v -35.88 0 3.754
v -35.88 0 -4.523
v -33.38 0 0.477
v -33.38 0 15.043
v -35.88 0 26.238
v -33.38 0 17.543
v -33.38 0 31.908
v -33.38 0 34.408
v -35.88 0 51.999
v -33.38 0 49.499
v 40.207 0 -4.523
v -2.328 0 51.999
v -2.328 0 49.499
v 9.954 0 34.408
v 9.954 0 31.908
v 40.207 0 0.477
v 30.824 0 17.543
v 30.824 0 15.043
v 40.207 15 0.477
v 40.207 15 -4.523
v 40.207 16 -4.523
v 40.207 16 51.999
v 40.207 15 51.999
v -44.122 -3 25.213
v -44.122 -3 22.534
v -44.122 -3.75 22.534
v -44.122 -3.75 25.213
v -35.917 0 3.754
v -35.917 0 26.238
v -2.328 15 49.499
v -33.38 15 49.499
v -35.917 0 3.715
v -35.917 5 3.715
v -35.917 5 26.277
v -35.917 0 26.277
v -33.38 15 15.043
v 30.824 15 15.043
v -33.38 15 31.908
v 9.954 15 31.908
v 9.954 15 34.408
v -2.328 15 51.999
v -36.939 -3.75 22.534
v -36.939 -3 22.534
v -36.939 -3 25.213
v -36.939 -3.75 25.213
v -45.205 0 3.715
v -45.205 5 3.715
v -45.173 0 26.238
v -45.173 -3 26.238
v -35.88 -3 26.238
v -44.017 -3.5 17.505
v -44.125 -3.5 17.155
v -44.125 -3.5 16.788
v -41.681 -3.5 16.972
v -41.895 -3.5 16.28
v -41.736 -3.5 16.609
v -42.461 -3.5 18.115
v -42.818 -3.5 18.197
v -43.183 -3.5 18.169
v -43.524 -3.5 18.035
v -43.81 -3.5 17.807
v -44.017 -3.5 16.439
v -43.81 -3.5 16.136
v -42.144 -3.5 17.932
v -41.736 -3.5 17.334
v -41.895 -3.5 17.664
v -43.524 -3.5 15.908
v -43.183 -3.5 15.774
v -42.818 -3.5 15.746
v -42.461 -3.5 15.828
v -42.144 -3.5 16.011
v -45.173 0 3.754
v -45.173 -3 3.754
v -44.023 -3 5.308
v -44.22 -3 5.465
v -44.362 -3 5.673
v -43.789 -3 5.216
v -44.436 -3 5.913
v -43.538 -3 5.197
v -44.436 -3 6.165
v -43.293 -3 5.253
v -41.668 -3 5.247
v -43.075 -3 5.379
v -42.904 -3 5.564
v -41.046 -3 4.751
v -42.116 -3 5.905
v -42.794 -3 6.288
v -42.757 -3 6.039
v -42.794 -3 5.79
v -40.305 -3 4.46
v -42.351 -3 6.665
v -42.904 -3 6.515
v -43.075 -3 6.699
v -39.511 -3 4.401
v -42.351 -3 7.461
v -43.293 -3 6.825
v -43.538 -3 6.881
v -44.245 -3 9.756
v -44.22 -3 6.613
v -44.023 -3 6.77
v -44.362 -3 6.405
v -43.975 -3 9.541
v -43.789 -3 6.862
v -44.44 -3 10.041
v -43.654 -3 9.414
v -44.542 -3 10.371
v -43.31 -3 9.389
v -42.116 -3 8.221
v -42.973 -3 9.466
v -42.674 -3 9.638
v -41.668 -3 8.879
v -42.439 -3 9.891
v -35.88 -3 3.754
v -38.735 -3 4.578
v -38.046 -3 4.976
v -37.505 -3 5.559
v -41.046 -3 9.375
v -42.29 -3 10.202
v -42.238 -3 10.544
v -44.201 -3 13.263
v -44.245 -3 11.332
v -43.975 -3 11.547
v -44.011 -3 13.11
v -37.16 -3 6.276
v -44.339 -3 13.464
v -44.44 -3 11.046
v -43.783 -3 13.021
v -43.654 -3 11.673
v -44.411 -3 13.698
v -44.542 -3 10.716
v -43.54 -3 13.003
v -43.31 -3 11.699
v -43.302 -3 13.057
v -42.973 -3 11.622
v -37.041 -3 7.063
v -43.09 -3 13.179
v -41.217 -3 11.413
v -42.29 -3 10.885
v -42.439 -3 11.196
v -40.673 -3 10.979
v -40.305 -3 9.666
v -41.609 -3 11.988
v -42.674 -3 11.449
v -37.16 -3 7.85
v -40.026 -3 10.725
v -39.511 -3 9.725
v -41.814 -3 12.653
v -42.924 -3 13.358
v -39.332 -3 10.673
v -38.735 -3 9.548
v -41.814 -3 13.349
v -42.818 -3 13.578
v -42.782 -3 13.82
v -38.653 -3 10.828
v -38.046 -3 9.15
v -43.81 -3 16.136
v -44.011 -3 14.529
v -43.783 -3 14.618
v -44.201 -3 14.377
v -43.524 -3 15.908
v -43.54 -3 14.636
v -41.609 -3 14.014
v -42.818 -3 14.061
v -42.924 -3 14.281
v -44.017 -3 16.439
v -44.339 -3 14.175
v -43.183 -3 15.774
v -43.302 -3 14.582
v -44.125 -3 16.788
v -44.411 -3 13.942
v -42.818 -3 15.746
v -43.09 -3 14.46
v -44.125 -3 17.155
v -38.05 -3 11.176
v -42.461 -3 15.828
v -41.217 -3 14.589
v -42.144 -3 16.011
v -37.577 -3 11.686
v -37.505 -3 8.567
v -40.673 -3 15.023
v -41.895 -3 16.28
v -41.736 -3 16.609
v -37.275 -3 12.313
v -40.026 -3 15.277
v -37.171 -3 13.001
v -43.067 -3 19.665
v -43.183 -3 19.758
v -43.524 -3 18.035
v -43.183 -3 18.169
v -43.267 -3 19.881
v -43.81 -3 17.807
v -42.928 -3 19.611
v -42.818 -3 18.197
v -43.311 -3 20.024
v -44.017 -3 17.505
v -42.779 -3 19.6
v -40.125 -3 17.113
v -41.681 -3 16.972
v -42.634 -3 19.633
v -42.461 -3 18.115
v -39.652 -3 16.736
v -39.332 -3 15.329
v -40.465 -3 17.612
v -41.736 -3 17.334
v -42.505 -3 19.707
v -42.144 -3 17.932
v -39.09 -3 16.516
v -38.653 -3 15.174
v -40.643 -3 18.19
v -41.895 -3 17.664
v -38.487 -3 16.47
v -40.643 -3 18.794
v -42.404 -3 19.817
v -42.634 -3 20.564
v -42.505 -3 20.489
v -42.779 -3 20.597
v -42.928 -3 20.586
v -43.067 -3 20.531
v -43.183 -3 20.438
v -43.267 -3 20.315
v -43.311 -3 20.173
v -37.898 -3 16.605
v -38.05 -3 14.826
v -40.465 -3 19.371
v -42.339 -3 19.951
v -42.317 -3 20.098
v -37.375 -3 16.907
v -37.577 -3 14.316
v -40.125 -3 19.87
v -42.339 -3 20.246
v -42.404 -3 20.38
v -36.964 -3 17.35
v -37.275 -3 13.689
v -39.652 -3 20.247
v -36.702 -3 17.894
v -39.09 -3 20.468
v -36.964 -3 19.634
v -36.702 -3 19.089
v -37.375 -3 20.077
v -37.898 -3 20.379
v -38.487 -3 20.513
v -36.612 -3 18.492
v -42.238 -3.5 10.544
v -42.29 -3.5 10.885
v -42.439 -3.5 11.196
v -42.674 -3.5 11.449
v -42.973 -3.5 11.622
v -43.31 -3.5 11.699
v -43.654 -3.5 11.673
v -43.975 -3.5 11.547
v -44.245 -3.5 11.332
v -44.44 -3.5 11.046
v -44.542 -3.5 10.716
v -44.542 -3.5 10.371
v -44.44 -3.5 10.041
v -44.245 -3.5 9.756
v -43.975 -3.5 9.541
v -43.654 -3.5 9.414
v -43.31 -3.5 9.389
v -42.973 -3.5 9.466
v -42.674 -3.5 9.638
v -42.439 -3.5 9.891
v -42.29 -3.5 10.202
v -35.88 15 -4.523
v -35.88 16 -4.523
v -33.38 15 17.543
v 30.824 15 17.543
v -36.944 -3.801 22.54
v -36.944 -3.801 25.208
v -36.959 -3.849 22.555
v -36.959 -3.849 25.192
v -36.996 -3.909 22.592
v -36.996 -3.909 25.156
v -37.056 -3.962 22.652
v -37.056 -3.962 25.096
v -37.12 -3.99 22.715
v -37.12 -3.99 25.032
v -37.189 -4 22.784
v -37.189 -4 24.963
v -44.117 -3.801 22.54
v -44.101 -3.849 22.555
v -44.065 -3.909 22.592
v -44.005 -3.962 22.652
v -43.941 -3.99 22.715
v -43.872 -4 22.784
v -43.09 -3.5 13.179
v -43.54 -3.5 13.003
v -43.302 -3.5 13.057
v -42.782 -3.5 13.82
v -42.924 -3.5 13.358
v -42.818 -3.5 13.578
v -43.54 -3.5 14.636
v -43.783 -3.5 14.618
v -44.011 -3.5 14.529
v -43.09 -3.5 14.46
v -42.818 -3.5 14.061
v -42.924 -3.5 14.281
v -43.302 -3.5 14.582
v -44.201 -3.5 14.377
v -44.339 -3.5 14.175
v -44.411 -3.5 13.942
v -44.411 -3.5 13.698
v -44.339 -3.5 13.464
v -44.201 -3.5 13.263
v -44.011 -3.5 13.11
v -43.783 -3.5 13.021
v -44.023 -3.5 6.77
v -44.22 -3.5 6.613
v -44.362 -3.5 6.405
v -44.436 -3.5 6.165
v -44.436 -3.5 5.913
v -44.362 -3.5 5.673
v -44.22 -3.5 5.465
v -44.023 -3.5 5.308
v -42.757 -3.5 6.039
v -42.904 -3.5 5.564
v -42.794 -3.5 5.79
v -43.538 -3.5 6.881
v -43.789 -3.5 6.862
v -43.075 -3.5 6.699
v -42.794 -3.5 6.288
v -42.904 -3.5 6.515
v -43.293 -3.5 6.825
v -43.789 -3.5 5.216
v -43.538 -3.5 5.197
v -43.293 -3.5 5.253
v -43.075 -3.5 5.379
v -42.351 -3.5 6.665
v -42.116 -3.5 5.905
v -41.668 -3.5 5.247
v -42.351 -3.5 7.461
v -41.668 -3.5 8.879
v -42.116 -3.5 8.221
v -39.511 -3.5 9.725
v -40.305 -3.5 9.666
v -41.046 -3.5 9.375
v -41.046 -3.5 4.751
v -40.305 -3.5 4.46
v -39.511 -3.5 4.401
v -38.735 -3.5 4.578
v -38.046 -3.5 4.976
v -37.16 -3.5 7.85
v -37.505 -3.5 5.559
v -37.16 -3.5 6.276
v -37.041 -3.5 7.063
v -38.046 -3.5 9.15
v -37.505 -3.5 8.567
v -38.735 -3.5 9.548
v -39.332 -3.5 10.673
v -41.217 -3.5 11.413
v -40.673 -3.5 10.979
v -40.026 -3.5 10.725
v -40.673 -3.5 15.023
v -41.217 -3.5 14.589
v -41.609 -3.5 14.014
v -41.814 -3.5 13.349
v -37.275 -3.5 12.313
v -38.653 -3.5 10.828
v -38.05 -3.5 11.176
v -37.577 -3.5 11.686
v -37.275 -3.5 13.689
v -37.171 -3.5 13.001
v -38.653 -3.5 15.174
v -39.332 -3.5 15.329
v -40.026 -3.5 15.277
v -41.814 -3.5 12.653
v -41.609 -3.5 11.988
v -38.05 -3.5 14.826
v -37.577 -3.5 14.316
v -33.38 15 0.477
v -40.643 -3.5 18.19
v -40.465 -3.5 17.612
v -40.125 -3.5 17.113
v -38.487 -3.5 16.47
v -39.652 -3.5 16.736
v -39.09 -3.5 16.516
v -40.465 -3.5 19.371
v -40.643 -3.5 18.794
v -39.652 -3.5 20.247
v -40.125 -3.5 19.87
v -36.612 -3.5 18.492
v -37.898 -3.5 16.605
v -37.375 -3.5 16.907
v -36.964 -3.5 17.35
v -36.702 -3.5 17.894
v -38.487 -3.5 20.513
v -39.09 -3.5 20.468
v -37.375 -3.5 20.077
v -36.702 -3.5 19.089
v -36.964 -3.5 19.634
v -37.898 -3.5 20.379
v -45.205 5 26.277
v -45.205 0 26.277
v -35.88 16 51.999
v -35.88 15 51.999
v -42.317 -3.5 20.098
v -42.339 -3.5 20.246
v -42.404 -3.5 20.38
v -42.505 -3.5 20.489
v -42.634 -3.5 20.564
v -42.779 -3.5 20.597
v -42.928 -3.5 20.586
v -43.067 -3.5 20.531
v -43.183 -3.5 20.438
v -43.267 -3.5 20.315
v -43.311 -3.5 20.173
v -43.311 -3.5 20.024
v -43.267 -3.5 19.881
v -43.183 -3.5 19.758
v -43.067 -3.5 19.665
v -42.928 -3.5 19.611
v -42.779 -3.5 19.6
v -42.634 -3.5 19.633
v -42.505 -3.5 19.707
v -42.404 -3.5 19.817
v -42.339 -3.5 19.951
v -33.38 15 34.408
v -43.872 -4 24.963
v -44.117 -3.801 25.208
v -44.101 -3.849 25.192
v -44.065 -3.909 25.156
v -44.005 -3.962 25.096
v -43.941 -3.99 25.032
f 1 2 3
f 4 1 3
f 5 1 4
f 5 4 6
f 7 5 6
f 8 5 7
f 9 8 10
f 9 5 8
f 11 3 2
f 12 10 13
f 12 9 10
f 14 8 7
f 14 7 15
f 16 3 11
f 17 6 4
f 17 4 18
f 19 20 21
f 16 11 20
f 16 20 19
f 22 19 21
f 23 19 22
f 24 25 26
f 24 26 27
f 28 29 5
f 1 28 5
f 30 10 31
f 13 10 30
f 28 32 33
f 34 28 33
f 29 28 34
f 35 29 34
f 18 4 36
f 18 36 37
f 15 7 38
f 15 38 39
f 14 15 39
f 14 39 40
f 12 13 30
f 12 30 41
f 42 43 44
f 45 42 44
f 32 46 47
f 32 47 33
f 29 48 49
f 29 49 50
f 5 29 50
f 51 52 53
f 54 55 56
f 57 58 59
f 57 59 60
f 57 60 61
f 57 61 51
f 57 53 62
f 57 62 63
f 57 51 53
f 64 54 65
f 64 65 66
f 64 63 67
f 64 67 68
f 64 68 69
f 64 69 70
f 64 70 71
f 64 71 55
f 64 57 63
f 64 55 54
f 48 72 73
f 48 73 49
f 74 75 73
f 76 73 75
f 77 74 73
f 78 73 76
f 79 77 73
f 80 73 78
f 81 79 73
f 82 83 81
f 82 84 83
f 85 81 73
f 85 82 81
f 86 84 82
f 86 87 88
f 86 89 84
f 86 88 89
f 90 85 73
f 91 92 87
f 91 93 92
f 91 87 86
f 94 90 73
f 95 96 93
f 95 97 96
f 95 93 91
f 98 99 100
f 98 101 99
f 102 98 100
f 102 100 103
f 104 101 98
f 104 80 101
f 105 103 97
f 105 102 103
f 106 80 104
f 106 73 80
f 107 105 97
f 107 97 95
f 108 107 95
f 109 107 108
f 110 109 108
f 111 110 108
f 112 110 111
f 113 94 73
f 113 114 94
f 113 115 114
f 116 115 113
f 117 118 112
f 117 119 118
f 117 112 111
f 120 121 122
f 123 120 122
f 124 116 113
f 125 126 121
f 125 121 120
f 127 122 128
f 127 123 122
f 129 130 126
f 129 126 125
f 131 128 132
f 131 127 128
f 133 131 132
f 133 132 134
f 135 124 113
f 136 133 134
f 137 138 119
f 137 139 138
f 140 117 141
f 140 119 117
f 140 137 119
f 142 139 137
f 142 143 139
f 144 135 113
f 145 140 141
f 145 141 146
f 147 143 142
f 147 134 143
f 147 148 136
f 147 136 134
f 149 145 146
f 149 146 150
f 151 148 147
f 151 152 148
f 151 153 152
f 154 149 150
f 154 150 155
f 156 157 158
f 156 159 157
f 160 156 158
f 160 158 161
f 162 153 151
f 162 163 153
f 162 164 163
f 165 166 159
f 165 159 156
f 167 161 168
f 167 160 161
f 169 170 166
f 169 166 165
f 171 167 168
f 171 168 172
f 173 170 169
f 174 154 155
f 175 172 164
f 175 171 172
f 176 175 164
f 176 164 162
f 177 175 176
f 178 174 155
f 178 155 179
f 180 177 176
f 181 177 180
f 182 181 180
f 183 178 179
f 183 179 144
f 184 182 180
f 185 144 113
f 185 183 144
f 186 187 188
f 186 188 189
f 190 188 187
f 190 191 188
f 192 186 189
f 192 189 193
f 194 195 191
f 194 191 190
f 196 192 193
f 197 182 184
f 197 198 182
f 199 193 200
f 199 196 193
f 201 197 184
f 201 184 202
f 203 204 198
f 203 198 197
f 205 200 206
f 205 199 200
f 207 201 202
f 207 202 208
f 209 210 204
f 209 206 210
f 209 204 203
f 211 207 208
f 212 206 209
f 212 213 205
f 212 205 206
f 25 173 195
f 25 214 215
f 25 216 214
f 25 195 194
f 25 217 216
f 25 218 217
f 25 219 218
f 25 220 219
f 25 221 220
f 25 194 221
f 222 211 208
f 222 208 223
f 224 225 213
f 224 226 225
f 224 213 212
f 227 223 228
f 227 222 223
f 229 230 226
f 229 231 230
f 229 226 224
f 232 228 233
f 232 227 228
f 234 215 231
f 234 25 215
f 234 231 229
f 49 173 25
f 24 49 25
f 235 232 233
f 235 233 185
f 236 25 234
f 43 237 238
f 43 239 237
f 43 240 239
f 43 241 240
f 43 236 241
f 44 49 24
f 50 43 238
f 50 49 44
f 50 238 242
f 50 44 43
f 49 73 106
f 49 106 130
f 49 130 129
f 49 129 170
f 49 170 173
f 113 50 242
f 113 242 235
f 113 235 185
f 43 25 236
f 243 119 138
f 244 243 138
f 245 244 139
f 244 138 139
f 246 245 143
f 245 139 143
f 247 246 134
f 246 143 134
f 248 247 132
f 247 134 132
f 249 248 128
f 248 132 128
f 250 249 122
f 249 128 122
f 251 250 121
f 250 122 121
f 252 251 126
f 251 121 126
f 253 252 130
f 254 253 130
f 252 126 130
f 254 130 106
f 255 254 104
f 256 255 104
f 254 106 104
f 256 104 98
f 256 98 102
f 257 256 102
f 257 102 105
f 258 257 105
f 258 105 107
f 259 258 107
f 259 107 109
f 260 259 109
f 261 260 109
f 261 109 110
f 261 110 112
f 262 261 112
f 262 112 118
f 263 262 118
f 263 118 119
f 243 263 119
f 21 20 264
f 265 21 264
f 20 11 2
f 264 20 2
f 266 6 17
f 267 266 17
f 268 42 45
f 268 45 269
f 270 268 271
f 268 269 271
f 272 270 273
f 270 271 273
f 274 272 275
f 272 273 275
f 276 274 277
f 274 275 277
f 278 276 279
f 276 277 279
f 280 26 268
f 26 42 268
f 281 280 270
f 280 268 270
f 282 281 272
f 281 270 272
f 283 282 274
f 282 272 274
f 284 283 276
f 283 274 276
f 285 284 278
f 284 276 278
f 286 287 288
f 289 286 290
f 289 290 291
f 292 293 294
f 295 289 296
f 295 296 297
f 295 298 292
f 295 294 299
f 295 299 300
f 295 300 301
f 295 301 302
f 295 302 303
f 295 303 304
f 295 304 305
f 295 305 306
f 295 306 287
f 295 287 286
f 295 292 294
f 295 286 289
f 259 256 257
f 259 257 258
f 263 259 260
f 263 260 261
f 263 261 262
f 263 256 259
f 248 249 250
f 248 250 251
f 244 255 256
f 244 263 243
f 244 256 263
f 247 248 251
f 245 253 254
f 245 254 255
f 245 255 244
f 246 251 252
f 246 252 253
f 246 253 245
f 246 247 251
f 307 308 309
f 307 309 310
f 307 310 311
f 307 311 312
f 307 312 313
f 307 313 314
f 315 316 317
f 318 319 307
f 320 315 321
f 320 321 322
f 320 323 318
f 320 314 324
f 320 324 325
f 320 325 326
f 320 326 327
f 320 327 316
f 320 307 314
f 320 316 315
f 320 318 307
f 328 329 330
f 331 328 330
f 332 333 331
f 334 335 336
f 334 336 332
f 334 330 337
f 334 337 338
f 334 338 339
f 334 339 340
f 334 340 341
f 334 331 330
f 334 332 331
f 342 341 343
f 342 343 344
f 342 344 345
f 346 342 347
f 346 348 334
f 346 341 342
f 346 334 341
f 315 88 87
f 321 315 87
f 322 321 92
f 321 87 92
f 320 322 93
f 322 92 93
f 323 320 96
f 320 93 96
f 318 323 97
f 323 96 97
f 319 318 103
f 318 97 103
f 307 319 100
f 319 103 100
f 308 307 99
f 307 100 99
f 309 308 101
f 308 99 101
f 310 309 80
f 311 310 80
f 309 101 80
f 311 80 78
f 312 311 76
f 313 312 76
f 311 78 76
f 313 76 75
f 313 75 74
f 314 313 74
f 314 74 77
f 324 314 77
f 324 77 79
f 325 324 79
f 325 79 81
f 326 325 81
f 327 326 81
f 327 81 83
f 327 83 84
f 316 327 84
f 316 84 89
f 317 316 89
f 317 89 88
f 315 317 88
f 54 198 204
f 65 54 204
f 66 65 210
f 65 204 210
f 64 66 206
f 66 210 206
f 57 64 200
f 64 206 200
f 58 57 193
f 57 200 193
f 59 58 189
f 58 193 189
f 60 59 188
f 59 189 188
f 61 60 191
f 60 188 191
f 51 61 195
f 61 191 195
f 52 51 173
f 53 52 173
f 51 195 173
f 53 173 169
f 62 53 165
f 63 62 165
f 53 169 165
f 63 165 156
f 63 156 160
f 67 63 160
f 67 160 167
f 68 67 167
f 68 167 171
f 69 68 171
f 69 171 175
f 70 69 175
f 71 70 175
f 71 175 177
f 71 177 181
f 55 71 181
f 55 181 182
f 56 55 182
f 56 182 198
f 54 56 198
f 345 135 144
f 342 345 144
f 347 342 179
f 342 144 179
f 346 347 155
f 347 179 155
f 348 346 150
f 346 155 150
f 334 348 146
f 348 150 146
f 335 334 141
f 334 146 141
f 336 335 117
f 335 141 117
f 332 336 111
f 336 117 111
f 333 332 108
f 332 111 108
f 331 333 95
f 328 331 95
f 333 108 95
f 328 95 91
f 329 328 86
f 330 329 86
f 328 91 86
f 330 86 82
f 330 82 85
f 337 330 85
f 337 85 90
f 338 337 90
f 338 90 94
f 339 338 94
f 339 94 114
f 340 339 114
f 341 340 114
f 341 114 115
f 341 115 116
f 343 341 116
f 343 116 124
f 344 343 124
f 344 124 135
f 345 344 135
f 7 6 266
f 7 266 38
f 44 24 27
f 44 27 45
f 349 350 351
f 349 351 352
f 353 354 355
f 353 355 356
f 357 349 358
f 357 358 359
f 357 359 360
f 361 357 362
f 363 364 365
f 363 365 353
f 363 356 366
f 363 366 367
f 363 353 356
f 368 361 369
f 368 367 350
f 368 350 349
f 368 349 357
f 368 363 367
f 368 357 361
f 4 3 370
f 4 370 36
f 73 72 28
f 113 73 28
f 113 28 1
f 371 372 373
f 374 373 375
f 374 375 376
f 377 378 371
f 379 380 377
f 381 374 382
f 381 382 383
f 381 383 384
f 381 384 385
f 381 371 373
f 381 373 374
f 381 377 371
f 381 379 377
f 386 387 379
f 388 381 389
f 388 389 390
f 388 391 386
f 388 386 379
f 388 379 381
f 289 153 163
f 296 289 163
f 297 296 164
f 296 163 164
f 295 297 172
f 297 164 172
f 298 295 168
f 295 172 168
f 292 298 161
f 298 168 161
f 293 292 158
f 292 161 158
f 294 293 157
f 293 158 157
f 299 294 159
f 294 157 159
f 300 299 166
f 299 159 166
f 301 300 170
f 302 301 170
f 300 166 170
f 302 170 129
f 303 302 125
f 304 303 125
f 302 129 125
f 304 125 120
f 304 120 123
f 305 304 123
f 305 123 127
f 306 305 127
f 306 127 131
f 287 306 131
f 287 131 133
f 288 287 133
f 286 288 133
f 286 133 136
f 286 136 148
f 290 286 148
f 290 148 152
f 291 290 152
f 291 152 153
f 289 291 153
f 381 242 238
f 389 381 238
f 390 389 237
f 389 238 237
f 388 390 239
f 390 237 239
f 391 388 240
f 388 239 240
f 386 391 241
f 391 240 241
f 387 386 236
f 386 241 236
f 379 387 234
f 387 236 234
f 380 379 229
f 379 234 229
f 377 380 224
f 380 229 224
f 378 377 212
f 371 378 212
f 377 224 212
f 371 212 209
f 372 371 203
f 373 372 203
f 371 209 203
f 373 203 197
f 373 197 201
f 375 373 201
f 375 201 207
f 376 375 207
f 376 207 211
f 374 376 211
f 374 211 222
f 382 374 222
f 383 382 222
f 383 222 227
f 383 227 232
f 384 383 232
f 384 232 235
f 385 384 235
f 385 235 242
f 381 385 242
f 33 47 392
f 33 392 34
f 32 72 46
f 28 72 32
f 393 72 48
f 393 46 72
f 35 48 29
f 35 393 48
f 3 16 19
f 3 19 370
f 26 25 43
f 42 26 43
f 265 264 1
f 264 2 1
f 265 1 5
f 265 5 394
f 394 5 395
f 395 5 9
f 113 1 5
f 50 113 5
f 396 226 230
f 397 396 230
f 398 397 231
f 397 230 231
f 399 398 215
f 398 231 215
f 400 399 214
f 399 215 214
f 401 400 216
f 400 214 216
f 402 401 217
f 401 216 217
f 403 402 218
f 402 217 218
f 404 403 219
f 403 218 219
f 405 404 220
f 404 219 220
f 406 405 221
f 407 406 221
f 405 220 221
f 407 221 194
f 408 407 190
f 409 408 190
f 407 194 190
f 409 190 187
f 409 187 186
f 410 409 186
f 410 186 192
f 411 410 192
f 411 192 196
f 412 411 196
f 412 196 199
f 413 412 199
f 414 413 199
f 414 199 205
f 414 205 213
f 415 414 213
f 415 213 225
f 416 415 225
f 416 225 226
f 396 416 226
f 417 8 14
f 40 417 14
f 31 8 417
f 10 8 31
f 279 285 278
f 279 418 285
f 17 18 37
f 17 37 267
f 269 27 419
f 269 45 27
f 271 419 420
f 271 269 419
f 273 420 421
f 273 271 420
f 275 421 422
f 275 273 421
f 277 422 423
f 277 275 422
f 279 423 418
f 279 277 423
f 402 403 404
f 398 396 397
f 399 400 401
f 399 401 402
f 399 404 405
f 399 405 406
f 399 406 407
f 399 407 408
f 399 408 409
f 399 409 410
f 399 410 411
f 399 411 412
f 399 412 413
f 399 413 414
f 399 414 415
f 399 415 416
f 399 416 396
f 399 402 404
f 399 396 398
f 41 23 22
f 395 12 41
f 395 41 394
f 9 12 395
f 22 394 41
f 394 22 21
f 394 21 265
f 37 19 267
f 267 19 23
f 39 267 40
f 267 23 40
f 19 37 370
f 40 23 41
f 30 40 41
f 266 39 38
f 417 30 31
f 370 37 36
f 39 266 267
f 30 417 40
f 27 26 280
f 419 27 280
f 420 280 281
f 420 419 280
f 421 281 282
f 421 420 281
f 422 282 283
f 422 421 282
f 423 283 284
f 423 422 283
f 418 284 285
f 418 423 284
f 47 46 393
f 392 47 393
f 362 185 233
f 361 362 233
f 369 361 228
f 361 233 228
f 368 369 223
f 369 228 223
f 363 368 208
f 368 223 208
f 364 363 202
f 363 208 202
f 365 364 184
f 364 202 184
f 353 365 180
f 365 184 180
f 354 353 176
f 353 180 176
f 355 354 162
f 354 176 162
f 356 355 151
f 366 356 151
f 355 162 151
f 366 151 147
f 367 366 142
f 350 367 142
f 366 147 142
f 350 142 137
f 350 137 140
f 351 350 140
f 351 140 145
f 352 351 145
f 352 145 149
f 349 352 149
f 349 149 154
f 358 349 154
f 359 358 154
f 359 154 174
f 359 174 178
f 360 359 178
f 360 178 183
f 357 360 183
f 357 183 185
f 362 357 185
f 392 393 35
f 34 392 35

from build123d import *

# Parameters (mm, degrees)
F0_R     = 2.0269538975
F1_DEPTH = 3.5
F0_R_2   = 0.5
F0_R_3   = 1.228518784
F0_R_4   = 2.3345460216
F0_R_5   = 0.8190125227
F0_R_6   = 1.1582592759
F0_R_7   = 2.6696554539
F0_R_8   = 0.8442192367
F0_W     = 7.1830786765
F0_H     = 2.6784352958
F2_DEPTH = 4
F0_W_2   = 9.2929721967
F0_H_2   = 22.4840222485
F3_DEPTH = 3
F0_W_3   = 43.3342937214
F0_H_3   = 2.5
F0_W_4   = 31.0516838037
F0_W_5   = 64.2038567705
F4_DEPTH = 15
F5_W     = 76.0869590251
F5_H     = 56.5217405497
F6_DEPTH = 1
F7_R     = 0.25
F8_W     = 9.2879496515
F8_H     = 22.5613792427
F9_DEPTH = 5


with BuildPart() as f1:
    # F0 (on Front) → F1 (new body)
    with BuildSketch(Plane.XZ):
        with Locations((-38.6387519538, 18.4917859733)):
            Circle(F0_R)
    extrude(amount=F1_DEPTH)



with BuildPart() as f1b:
    # F0 (on Front) → F1, piece 2 (new body)
    with BuildSketch(Plane.XZ):
        with Locations((-42.8166687813, 20.0982914169)):
            Circle(F0_R_2)
    extrude(amount=F1_DEPTH)


with BuildPart() as f1c:
    # F0 (on Front) → F1, piece 3 (new body)
    with BuildSketch(Plane.XZ):
        with Locations((-42.9098382592, 16.9715695083)):
            Circle(F0_R_3)
    extrude(amount=F1_DEPTH)


with BuildPart() as f1d:
    # F0 (on Front) → F1, piece 4 (new body)
    with BuildSketch(Plane.XZ):
        with Locations((-39.5060256124, 13.0007341504)):
            Circle(F0_R_4)
    extrude(amount=F1_DEPTH)


with BuildPart() as f1e:
    # F0 (on Front) → F1, piece 5 (new body)
    with BuildSketch(Plane.XZ):
        with Locations((-43.6010956764, 13.8197485358)):
            Circle(F0_R_5)
    extrude(amount=F1_DEPTH)


with BuildPart() as f1f:
    # F0 (on Front) → F1, piece 6 (new body)
    with BuildSketch(Plane.XZ):
        with Locations((-43.3963425457, 10.5436937883)):
            Circle(F0_R_6)
    extrude(amount=F1_DEPTH)


with BuildPart() as f1g:
    # F0 (on Front) → F1, piece 7 (new body)
    with BuildSketch(Plane.XZ):
        with Locations((-39.710778743, 7.0628863759)):
            Circle(F0_R_7)
    extrude(amount=F1_DEPTH)


with BuildPart() as f1h:
    # F0 (on Front) → F1, piece 8 (new body)
    with BuildSketch(Plane.XZ):
        with Locations((-43.6010956764, 6.0391197912)):
            Circle(F0_R_8)
    extrude(amount=F1_DEPTH)


with BuildPart() as f2:
    # F0 (on Front) → F2 (new body)
    with BuildSketch(Plane.XZ):
        with Locations((-40.5303072184, 23.8736141473)):
            Rectangle(F0_W, F0_H)
    extrude(amount=F2_DEPTH)


with BuildPart() as f1_1:
    add(f1.part)

    add(f1b.part)  # F3 merges F1b

    add(f1c.part)  # F3 merges F1c

    add(f1d.part)  # F3 merges F1d

    add(f1e.part)  # F3 merges F1e

    add(f1f.part)  # F3 merges F1f

    add(f1g.part)  # F3 merges F1g

    add(f1h.part)  # F3 merges F1h

    add(f2.part)  # F3 merges F2
    # F0 (on Front) → F3 (join)
    with BuildSketch(Plane.XZ):
        with Locations((-40.5266187541, 14.9962106068)):
            Rectangle(F0_W_2, F0_H_2)
        with Locations((-43.6010956764, 6.0391197912)):
            Circle(F0_R_8, mode=Mode.SUBTRACT)
        with Locations((-39.710778743, 7.0628863759)):
            Circle(F0_R_7, mode=Mode.SUBTRACT)
        with Locations((-43.3963425457, 10.5436937883)):
            Circle(F0_R_6, mode=Mode.SUBTRACT)
        with Locations((-39.5060256124, 13.0007341504)):
            Circle(F0_R_4, mode=Mode.SUBTRACT)
        with Locations((-43.6010956764, 13.8197485358)):
            Circle(F0_R_5, mode=Mode.SUBTRACT)
        with Locations((-42.9098382592, 16.9715695083)):
            Circle(F0_R_3, mode=Mode.SUBTRACT)
        with Locations((-42.8166687813, 20.0982914169)):
            Circle(F0_R_2, mode=Mode.SUBTRACT)
        with Locations((-38.6387519538, 18.4917859733)):
            Circle(F0_R, mode=Mode.SUBTRACT)
        with Locations((-40.5303072184, 23.8736141473)):
            Rectangle(F0_W, F0_H, mode=Mode.SUBTRACT)
    extrude(amount=F3_DEPTH)

    # F0 (on Front) → F4 (join)
    with BuildSketch(Plane.XZ):
        with Locations((-11.712985795, 33.1576881444)):
            Rectangle(F0_W_3, F0_H_3)
        with Locations((-17.8542907539, 50.7490920059)):
            Rectangle(F0_W_4, F0_H_3)
        Polygon((-35.8801326557, 3.7541994825), (-35.8801326557, 0.4773514562), (-33.3801326557, 0.4773514562), (-33.3801326557, 15.0425690249), (-33.3801326557, 17.5425690249), (-33.3801326557, 31.9076881444), (-33.3801326557, 34.4076881444), (-33.3801326557, 49.4990920059), (-33.3801326557, 51.9990920059), (-35.8801326557, 51.9990920059), (-35.8801326557, 26.238221731), align=None)
        with Locations((-1.2782042705, 16.2925690249)):
            Rectangle(F0_W_5, F0_H_3)
        Polygon((-33.3801326557, 0.4773514562), (-35.8801326557, 0.4773514562), (-35.8801326557, -4.5226485438), (40.2068263694, -4.5226485438), (40.2068263694, 0.4773514562), align=None)
    extrude(amount=-F4_DEPTH)

    # F5 (on face) → F6 (join)
    with BuildSketch(Plane(origin=(0, 15, 0), x_dir=(-1, 0, 0), z_dir=(0, 1, 0))):
        with Locations((-2.1633468568, 23.738221731)):
            Rectangle(F5_W, F5_H)
    extrude(amount=F6_DEPTH)

    # F7
    f7_edges = [f1_1.edges().sort_by_distance(p)[0] for p in [
        (-40.530307, -4, 22.534396),
        (-40.530307, -4, 25.212832),
        (-36.938768, -4, 23.873614),
        (-44.121847, -4, 23.873614),
    ]]
    fillet(f7_edges, radius=F7_R)

    # F8 (on face) → F9 (join)
    with BuildSketch(Plane.XZ):
        with Locations((-40.561305359, 14.9959118571)):
            Rectangle(F8_W, F8_H)
    extrude(amount=-F9_DEPTH)


solid = f1_1.part
